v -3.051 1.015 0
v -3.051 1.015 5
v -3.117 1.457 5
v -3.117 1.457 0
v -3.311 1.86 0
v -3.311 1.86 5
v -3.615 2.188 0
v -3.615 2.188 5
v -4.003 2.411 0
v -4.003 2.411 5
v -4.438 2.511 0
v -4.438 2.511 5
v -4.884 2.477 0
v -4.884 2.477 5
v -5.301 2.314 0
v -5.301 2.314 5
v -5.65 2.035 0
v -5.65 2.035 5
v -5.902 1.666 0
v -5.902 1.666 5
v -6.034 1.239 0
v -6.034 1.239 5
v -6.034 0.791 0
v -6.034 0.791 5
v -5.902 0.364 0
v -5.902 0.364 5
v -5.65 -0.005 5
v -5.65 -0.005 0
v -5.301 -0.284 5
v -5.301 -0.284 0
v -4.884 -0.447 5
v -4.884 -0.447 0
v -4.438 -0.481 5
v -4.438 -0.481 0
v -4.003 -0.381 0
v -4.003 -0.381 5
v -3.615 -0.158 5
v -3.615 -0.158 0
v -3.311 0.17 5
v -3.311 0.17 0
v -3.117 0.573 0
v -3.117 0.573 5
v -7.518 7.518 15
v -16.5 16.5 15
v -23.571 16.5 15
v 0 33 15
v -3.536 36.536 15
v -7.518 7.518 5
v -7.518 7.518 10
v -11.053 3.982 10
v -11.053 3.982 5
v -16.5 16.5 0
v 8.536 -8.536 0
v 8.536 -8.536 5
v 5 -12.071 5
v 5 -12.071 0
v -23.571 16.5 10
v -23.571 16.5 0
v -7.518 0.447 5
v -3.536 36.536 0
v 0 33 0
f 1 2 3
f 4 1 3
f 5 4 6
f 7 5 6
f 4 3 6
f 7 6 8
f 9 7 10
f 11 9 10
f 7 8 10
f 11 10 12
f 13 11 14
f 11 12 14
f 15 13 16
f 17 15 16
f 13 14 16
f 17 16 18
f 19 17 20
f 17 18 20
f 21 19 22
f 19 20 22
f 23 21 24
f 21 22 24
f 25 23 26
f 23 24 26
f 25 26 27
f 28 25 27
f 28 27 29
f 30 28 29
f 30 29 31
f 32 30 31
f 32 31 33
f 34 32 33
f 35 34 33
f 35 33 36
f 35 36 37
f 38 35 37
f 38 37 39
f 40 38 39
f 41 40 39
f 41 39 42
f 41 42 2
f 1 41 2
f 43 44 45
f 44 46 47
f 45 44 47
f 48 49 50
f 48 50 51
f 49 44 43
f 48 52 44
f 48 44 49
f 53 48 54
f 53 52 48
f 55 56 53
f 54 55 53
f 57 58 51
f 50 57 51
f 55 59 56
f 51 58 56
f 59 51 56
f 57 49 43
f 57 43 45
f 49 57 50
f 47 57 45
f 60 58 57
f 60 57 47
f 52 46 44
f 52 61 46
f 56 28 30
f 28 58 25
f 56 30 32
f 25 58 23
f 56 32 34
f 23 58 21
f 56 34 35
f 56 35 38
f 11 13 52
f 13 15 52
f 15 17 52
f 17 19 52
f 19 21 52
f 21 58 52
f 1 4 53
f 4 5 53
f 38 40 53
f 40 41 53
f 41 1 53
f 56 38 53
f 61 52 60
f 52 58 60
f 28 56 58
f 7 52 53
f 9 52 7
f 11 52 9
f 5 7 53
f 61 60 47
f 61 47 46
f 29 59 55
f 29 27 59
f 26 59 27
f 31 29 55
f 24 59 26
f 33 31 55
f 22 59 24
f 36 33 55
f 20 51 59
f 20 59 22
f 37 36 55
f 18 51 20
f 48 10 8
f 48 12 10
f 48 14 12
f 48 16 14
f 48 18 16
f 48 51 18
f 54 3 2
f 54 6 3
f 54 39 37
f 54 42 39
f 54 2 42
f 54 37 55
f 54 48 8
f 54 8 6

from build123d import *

# Parameters (mm, degrees)
EXTRUDE_1_DEPTH     = 10
SKETCH_2_R          = 1.5
CUT_EXTRUDE_1_DEPTH = 10
SKETCH_3_R          = 1.5
CUT_EXTRUDE_4_DEPTH = 5
SKETCH_4_W          = 5
SKETCH_4_H          = 5
CUT_EXTRUDE_5_DEPTH = 5
EXTRUDE_2_DEPTH     = 5


with BuildPart() as part:
    # 草图1 → 凸台-拉伸1 (new body)
    with BuildSketch(Plane.XY):
        Polygon((-23.571067812, 16.5), (5, -12.071067812), (8.535533906, -8.535533906), (6.051882873, -6.051882873), (0, 0), (-16.5, 16.5), (0, 33), (-3.535533906, 36.535533906), align=None)
    extrude(amount=EXTRUDE_1_DEPTH)

    # 草图2 → 切除-拉伸1 (cut)
    with BuildSketch(Plane.XY.offset(10)):
        with Locations((-4.550561614, 1.015027708)):
            Circle(SKETCH_2_R)
    extrude(amount=-CUT_EXTRUDE_1_DEPTH, mode=Mode.SUBTRACT)

    # 草图3 → 切除-拉伸4 (cut)
    with BuildSketch(Plane.XY.offset(10)):
        Polygon((-1.596461706, 6.368004388), (-3.982233047, 3.982233047), (8.535533906, -8.535533906), (5, -12.071067812), (-7.517766953, 0.446699141), (-9.33715939, -1.372693296), (6.144235978, -17.323833909), (15.036478659, -7.320060893), align=None)
        Polygon((8.535533906, -8.535533906), (-3.982233047, 3.982233047), (-4.279030417, 3.685435677), (-7.517766953, 0.446699141), (5, -12.071067812), align=None)
        with Locations((-4.550561614, 1.015027708)):
            Circle(SKETCH_3_R, mode=Mode.SUBTRACT)
    extrude(amount=-CUT_EXTRUDE_4_DEPTH, mode=Mode.SUBTRACT)

    # 草图4 → 切除-拉伸5 (cut)
    with BuildSketch(Plane(origin=(-3.982233047, 3.982233047, 0), x_dir=(0, 0, -1), z_dir=(0.707106781, -0.707106781, 0))):
        with Locations((-7.5, -2.5)):
            Rectangle(SKETCH_4_W, SKETCH_4_H)
    extrude(amount=-CUT_EXTRUDE_5_DEPTH, mode=Mode.SUBTRACT)

    # 草图5 → 凸台-拉伸2 (add)
    with BuildSketch(Plane.XY.offset(10)):
        Polygon((-7.517766953, 7.517766953), (-23.571067812, 16.5), (-3.535533906, 36.535533906), (0, 33), (-16.5, 16.5), align=None)
    extrude(amount=EXTRUDE_2_DEPTH)


solid = part.part
